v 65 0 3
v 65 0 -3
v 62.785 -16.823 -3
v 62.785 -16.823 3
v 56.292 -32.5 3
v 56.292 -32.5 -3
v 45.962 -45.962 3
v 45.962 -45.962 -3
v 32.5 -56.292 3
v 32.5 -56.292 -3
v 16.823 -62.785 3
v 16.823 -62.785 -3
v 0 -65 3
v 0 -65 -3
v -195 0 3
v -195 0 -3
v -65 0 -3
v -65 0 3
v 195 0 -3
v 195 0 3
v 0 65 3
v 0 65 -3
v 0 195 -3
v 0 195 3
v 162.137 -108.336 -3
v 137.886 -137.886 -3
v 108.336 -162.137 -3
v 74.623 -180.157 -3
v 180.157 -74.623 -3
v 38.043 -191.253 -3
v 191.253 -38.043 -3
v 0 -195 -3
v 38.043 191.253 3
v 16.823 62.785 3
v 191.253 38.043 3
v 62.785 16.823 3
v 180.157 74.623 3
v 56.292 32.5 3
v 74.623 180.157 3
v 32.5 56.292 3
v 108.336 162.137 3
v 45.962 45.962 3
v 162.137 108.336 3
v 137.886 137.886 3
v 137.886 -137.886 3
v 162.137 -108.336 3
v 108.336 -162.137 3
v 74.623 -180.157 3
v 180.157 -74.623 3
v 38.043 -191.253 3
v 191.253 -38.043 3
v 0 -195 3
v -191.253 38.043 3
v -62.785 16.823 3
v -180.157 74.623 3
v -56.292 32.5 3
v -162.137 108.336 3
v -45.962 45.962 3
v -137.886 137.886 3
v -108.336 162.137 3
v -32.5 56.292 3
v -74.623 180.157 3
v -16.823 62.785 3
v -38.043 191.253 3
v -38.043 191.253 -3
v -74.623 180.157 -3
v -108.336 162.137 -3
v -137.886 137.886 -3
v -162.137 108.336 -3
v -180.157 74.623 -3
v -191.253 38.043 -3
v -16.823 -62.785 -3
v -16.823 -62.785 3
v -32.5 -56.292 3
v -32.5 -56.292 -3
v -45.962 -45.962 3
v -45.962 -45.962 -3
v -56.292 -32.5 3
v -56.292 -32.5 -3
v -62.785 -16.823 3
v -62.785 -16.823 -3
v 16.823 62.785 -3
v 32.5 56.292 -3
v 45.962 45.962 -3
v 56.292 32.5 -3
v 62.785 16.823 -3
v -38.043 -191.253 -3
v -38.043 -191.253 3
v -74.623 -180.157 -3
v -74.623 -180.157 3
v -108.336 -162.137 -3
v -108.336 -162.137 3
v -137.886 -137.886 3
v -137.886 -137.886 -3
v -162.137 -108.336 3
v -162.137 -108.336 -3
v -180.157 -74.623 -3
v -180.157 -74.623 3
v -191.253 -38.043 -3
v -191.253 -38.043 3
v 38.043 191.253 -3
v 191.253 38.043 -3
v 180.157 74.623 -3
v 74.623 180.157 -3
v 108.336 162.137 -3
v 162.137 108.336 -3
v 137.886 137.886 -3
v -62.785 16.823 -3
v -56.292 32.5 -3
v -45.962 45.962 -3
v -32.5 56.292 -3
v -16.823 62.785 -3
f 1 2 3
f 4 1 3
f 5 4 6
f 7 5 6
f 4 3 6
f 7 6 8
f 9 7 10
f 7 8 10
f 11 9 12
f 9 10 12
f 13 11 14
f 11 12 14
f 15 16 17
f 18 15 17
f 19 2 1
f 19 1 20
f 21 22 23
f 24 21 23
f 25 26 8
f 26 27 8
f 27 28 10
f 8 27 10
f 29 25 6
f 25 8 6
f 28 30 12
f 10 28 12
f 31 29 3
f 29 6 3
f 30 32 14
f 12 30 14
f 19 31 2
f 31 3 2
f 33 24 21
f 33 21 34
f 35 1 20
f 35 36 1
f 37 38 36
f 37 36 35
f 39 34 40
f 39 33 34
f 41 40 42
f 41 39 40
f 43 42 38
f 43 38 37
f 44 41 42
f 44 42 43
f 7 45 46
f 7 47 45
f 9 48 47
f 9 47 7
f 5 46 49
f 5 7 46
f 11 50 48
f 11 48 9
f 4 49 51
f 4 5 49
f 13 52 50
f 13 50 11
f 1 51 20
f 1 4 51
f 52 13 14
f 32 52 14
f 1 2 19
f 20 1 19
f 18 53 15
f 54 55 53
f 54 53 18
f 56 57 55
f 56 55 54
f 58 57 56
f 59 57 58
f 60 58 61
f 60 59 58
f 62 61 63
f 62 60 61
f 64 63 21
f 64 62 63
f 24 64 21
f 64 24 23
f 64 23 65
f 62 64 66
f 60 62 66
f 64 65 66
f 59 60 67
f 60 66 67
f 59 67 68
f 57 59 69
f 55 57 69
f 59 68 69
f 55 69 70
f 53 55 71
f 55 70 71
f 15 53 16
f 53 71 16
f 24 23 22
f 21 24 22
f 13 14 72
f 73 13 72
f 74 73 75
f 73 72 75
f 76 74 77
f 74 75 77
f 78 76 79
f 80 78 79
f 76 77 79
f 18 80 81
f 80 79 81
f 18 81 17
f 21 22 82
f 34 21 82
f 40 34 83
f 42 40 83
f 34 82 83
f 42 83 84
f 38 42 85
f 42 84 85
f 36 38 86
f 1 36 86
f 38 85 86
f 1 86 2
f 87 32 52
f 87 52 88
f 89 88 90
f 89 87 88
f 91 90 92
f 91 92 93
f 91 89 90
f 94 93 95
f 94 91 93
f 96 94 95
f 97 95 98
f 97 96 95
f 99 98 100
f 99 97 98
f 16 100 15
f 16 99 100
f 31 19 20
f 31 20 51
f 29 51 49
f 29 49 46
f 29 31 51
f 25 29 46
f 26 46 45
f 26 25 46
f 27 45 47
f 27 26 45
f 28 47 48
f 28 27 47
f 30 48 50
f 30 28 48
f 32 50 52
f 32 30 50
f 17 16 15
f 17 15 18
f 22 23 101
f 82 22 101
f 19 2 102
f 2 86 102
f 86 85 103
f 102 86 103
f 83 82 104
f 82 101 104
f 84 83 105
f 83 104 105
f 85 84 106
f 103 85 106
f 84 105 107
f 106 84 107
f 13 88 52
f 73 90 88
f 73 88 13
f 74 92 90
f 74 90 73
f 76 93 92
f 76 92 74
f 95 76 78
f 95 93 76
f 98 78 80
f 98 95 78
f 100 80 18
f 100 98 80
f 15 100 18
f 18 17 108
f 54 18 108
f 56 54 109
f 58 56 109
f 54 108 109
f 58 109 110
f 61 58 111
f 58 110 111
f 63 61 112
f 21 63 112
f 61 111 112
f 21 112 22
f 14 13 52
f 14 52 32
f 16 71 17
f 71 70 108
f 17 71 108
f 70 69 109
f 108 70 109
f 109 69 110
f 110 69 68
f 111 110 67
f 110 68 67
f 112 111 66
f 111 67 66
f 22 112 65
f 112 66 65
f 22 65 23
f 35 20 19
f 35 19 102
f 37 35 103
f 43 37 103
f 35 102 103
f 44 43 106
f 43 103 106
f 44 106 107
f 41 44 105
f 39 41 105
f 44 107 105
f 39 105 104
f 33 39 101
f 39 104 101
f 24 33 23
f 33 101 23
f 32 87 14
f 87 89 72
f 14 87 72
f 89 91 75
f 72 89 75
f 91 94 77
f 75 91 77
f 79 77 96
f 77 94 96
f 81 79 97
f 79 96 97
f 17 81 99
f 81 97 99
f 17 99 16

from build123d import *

# Parameters (mm, degrees)
SKETCH1_W          = 6
SKETCH1_H          = 130
SKETCH3_W          = 6
SKETCH3_H          = 390
SPLIT2_OUTLINE_W   = 196
SPLIT2_OUTLINE_H   = 6
SPLIT2_DEPTH       = 195
SPLIT2_START       = -3
SPLIT2_2_DEPTH     = 6
SPLIT2_3_OUTLINE_W = 196
SPLIT2_3_OUTLINE_H = 6
SPLIT2_3_DEPTH     = 195
SPLIT2_4_DEPTH     = 6


# Read off the part's stored shape, not the designer's step: Split2
with BuildPart() as part:
    # Sketch1 → Revolve1 (revolve)
    with BuildSketch(Plane(origin=(0, 0, 0), x_dir=(0, 0, -1), z_dir=(1, 0, 0)), mode=Mode.PRIVATE) as revolve1_sk:
        with Locations((0, 130)):
            Rectangle(SKETCH1_W, SKETCH1_H)
    revolve(revolve1_sk.sketch.rotate(Axis((0, 0, 3), (0, 0, -1)), 180), axis=Axis((0, 0, 3), (0, 0, -1)))


with BuildPart() as body_2:
    # Split1: the piece behind the surface
    add(part.part)
    # Sketch3 → Surface-Plane1: a flat surface bounded by the sketch
    with BuildSketch(Plane(origin=(0, 0, 0), x_dir=(0, 0, -1), z_dir=(1, 0, 0)), mode=Mode.PRIVATE) as surface_plane1_1_region:
        Rectangle(SKETCH3_W, SKETCH3_H)
    surface_plane1_1 = surface_plane1_1_region.sketch.faces()[0]
    split(bisect_by=surface_plane1_1, keep=Keep.BOTTOM)

    # Split2 outline → Split2 (cut)
    with BuildSketch(Plane(origin=(0, 0, 0), x_dir=(1, 0, 0), z_dir=(0, 1, 0))):
        with Locations((-98, 0)):
            Rectangle(SPLIT2_OUTLINE_W, SPLIT2_OUTLINE_H)
    extrude(amount=SPLIT2_DEPTH, mode=Mode.SUBTRACT)


with BuildPart() as part_1:
    add(part.part)

    # Split1: split by a surface, the side it looks to stays
    # Sketch3 → Surface-Plane1: a flat surface bounded by the sketch
    with BuildSketch(Plane(origin=(0, 0, 0), x_dir=(0, 0, -1), z_dir=(1, 0, 0)), mode=Mode.PRIVATE) as surface_plane1_2_region:
        Rectangle(SKETCH3_W, SKETCH3_H)
    surface_plane1_2 = surface_plane1_2_region.sketch.faces()[0]
    split(bisect_by=surface_plane1_2, keep=Keep.TOP)

    # Split2 3 outline → Split2 3 (cut)
    with BuildSketch(Plane(origin=(0, 0, 0), x_dir=(1, 0, 0), z_dir=(0, 1, 0))):
        with Locations((98, 0)):
            Rectangle(SPLIT2_3_OUTLINE_W, SPLIT2_3_OUTLINE_H)
    extrude(amount=SPLIT2_3_DEPTH, mode=Mode.SUBTRACT)


with BuildPart() as body_3:
    # Split2 2 outline → Split2 2 (new body)
    with BuildSketch(Plane.XY.offset(SPLIT2_START)):
        with BuildLine():
            Line((-195, 0), (-65, 0))
            ThreePointArc((-65, 0), (-45.961940777, 45.961940777), (0, 65))
            Line((0, 65), (0, 195))
            ThreePointArc((0, 195), (-137.885822331, 137.885822331), (-195, 0))
        make_face()
    extrude(amount=SPLIT2_2_DEPTH)


with BuildPart() as body_4:
    # Split2 4 outline → Split2 4 (new body)
    with BuildSketch(Plane.XY.offset(SPLIT2_START)):
        with BuildLine():
            Line((65, 0), (195, 0))
            ThreePointArc((195, 0), (137.885822331, 137.885822331), (0, 195))
            Line((0, 195), (0, 65))
            ThreePointArc((0, 65), (45.961940777, 45.961940777), (65, 0))
        make_face()
    extrude(amount=SPLIT2_4_DEPTH)


solid = Compound([body_2.part, part_1.part, body_3.part, body_4.part])
